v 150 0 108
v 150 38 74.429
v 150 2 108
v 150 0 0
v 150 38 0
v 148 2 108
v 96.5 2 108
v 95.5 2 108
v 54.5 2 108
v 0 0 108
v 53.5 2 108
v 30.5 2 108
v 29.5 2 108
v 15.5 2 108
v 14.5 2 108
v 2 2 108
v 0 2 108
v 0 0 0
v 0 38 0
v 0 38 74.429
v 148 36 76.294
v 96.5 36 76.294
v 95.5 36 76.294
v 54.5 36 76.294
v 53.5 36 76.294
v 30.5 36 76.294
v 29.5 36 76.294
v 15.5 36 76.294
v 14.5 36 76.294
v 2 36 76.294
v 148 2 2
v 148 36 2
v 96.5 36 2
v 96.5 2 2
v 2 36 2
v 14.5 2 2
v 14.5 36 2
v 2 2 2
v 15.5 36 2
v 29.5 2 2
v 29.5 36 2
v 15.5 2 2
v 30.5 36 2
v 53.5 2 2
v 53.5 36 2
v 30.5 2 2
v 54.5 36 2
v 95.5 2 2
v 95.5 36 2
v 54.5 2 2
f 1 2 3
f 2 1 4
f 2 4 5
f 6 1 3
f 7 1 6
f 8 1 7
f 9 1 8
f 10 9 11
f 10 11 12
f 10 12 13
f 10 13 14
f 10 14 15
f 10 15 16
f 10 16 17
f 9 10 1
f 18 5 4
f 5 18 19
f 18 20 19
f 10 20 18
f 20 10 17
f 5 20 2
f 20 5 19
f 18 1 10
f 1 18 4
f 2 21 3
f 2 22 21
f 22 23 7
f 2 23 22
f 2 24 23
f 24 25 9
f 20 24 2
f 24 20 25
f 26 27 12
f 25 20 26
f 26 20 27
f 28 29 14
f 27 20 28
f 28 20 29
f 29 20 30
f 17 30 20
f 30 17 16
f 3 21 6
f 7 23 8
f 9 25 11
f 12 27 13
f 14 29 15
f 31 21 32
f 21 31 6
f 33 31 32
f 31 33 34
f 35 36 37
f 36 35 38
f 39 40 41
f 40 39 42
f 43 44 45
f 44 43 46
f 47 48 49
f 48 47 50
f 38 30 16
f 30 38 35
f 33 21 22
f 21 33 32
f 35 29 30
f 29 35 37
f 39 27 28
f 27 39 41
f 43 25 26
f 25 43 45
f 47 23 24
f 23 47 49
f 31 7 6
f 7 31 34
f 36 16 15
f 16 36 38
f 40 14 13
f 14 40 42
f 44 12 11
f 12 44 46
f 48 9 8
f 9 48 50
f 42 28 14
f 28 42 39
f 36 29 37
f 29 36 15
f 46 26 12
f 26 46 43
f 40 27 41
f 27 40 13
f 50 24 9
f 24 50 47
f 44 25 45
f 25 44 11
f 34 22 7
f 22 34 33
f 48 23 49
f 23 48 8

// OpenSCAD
// customizable magnetic pencil holder
// created by james wickware - 7/14/16

// preview[view:north east, tilt:top diagonal]

/* [Size] */
// The overall width of the pencil holder in millimeters.
width = 150; // [0:0.5:400]

// The overall depth of the pencil holder in millimeters.
depth = 38; // [0:0.5:200]

// The overall height of the pencil holder in millimeters.
height = 108; // [0:0.5:200]

/* [Walls] */
// The thickness of the outer walls in millimeters.  
outer_wall_thickness = 2; // [0.5:0.5:20]

// The thickness of the inner walls in millimeters.
inner_wall_thickness = 1; // [0.5:0.5:20]

/* [Sections] */
// The number of sections the holder will be divided into.
sections = 5; // [1:30]

// Controls the size of each section is calculated. "Constant" will make each section the same size. "Increasing" will make each section double in size from the previous from left to right. "Decreasing" will make each section half the size of the previous from left to right.
division_mode = 2; // [0:Constant ,1: Increasing ,2:Decreasing]

// Sets the minimum size a section can be in millimeters for the "Increasing" and "Decreasing" division modes. *A large value here may cause less sections to be generated depending on the width of the holder and the number of sections selected.
minimum_section_width = 15; // [0:100]

/* [Bevel] */
// Controls how the opening of the holder is beveled.  
bevel_type = 0; // [0:Flat ,1:Round, 2:Scoop]

// Controls the angle of the bevel in degrees for Flat bevel and the radius for Round and Scoop bevels.
bevel= 43;	//	[0:0.5:80]
/* [Other] */
// Choose whether to generate the pencil holder standing upright or laying on its back.
upright =0; //[0:Yes, 1:No]
 
 
// generate holder upright or lying down
translate([0,height * upright,0]) // [0:Yes, 1:No]
rotate([upright * 90, 0,0])   
union()
{
    difference()
    {
        difference()
        {
            cube([width, depth, height],false);
            translate([-10,outer_wall_thickness,height])
            rotate([-bevel,0,0])
            
            // bevel outer walls
            if(bevel_type == 0)
            {                
                cube([width*2, depth*2, height*2],false);
            }

            if(bevel_type == 1)
            {
                translate([-outer_wall_thickness,depth+outer_wall_thickness,height]) 
                rotate([90,0,90])
                difference()
                {
                    translate( [-outer_wall_thickness, 0  ,0]) 
                    cylinder(h=width+(outer_wall_thickness*4), r=(depth/45)*bevel ) ;
                    translate([-((depth/45)*bevel) -outer_wall_thickness,-((depth/45)*bevel)   ,0]) 
                    cylinder(h=width+(outer_wall_thickness*8) , r=(depth/45)*bevel );    
                }
            }
            
            if(bevel_type == 2)
            {
                translate([-outer_wall_thickness,depth+outer_wall_thickness,height]) 
                rotate([90,0,90])
                cylinder(h=width+(outer_wall_thickness*2), r=(depth/45)*bevel);
            }  
        }
        
        translate([outer_wall_thickness,outer_wall_thickness,outer_wall_thickness])
        cube ([width - (outer_wall_thickness*2), depth- (outer_wall_thickness*2), height], false);
    };

    for(i = [1:sections-1  ])
    {    
        if(division_mode == 0)
        { 
            difference()
            {
                translate([((width/sections) * i - (inner_wall_thickness/2)),0 ,0])      
                cube([inner_wall_thickness, (depth), height],false);
                translate([-outer_wall_thickness,outer_wall_thickness,height])
                rotate([-bevel,0,0]) 
                
                // bevel inner walls 
                if(bevel_type == 0)
                {
                    cube([width*2, depth*2, height*2],false);
                }
              
                if(bevel_type == 1)
                {
                    translate([-outer_wall_thickness,depth+outer_wall_thickness,height]) 
                    rotate([90,0,90])
                    difference()
                    {
                        translate( [-outer_wall_thickness, 0  ,0]) 
                        cylinder(h=width+(outer_wall_thickness*4), r=(depth/45)*bevel ) ;
                        translate([-((depth/45)*bevel) -outer_wall_thickness,-((depth/45)*bevel)   ,0]) 
                        cylinder(h=width+(outer_wall_thickness*8) , r=(depth/45)*bevel );    
                    }
                }

                if(bevel_type == 2)
                {
                    translate([-outer_wall_thickness,depth+outer_wall_thickness,height]) 
                    rotate([90,0,90])
                    cylinder(h=width+(outer_wall_thickness*2), r=(depth/45)*bevel);
                }
            } 
        }
        
        // Increasing section size      
        if (division_mode == 1)
        {
            difference()
            {          
                translate([width - (min(max((((width/sections) * i)/(sections/i)),(minimum_section_width*i)), width )) +(inner_wall_thickness/2) ,0 ,0])    
                cube([inner_wall_thickness, (depth), height],false);
                translate([-outer_wall_thickness,outer_wall_thickness,height])
                rotate([-bevel,0,0]) 
                
                // bevel inner walls 
                if(bevel_type == 0)
                {
                    cube([width*2, depth*2, height*2],false);
                }
                
                if(bevel_type == 1)
                {
                    translate([-outer_wall_thickness,depth+outer_wall_thickness,height]) 
                    rotate([90,0,90])
                    difference()
                    {
                        translate( [-outer_wall_thickness, 0  ,0]) 
                        cylinder(h=width+(outer_wall_thickness*4), r=(depth/45)*bevel ) ;
                        translate([-((depth/45)*bevel) -outer_wall_thickness,-((depth/45)*bevel)   ,0]) 
                        cylinder(h=width+(outer_wall_thickness*8) , r=(depth/45)*bevel );    
                    }
                }
                    
                 if(bevel_type == 2)
                {
                    translate([-outer_wall_thickness,depth+outer_wall_thickness,height]) 
                    rotate([90,0,90])
                    cylinder(h=width+(outer_wall_thickness*2), r=(depth/45)*bevel);
                }
            } 
        }
        
        if (division_mode == 2)
        {
            difference()
            {          
                translate([min(max((((width/sections) * i)/(sections/i)),(minimum_section_width*i)), width ) -(inner_wall_thickness/2) ,0 ,0])    
                cube([inner_wall_thickness, (depth), height],false);
                translate([-outer_wall_thickness,outer_wall_thickness,height])
                rotate([-bevel,0,0]) 
                
                // bevel inner walls 
                if(bevel_type == 0)
                {
                    cube([width*2, depth*2, height*2],false);
                }
 
                if(bevel_type == 1)
                {
                    translate([-outer_wall_thickness,depth+outer_wall_thickness,height]) 
                    rotate([90,0,90])
                    difference()
                    {
                        translate( [-outer_wall_thickness, 0  ,0]) 
                        cylinder(h=width+(outer_wall_thickness*4), r=(depth/45)*bevel ) ;
                        translate([-((depth/45)*bevel) -outer_wall_thickness,-((depth/45)*bevel)   ,0]) 
                        cylinder(h=width+(outer_wall_thickness*8) , r=(depth/45)*bevel );    
                    }
                }
                
                if(bevel_type == 2)
                {
                    translate([-outer_wall_thickness,depth+outer_wall_thickness,height]) 
                    rotate([90,0,90])
                    cylinder(h=width+(outer_wall_thickness*2), r=(depth/45)*bevel);
                }
            } 
        }
    }
}
